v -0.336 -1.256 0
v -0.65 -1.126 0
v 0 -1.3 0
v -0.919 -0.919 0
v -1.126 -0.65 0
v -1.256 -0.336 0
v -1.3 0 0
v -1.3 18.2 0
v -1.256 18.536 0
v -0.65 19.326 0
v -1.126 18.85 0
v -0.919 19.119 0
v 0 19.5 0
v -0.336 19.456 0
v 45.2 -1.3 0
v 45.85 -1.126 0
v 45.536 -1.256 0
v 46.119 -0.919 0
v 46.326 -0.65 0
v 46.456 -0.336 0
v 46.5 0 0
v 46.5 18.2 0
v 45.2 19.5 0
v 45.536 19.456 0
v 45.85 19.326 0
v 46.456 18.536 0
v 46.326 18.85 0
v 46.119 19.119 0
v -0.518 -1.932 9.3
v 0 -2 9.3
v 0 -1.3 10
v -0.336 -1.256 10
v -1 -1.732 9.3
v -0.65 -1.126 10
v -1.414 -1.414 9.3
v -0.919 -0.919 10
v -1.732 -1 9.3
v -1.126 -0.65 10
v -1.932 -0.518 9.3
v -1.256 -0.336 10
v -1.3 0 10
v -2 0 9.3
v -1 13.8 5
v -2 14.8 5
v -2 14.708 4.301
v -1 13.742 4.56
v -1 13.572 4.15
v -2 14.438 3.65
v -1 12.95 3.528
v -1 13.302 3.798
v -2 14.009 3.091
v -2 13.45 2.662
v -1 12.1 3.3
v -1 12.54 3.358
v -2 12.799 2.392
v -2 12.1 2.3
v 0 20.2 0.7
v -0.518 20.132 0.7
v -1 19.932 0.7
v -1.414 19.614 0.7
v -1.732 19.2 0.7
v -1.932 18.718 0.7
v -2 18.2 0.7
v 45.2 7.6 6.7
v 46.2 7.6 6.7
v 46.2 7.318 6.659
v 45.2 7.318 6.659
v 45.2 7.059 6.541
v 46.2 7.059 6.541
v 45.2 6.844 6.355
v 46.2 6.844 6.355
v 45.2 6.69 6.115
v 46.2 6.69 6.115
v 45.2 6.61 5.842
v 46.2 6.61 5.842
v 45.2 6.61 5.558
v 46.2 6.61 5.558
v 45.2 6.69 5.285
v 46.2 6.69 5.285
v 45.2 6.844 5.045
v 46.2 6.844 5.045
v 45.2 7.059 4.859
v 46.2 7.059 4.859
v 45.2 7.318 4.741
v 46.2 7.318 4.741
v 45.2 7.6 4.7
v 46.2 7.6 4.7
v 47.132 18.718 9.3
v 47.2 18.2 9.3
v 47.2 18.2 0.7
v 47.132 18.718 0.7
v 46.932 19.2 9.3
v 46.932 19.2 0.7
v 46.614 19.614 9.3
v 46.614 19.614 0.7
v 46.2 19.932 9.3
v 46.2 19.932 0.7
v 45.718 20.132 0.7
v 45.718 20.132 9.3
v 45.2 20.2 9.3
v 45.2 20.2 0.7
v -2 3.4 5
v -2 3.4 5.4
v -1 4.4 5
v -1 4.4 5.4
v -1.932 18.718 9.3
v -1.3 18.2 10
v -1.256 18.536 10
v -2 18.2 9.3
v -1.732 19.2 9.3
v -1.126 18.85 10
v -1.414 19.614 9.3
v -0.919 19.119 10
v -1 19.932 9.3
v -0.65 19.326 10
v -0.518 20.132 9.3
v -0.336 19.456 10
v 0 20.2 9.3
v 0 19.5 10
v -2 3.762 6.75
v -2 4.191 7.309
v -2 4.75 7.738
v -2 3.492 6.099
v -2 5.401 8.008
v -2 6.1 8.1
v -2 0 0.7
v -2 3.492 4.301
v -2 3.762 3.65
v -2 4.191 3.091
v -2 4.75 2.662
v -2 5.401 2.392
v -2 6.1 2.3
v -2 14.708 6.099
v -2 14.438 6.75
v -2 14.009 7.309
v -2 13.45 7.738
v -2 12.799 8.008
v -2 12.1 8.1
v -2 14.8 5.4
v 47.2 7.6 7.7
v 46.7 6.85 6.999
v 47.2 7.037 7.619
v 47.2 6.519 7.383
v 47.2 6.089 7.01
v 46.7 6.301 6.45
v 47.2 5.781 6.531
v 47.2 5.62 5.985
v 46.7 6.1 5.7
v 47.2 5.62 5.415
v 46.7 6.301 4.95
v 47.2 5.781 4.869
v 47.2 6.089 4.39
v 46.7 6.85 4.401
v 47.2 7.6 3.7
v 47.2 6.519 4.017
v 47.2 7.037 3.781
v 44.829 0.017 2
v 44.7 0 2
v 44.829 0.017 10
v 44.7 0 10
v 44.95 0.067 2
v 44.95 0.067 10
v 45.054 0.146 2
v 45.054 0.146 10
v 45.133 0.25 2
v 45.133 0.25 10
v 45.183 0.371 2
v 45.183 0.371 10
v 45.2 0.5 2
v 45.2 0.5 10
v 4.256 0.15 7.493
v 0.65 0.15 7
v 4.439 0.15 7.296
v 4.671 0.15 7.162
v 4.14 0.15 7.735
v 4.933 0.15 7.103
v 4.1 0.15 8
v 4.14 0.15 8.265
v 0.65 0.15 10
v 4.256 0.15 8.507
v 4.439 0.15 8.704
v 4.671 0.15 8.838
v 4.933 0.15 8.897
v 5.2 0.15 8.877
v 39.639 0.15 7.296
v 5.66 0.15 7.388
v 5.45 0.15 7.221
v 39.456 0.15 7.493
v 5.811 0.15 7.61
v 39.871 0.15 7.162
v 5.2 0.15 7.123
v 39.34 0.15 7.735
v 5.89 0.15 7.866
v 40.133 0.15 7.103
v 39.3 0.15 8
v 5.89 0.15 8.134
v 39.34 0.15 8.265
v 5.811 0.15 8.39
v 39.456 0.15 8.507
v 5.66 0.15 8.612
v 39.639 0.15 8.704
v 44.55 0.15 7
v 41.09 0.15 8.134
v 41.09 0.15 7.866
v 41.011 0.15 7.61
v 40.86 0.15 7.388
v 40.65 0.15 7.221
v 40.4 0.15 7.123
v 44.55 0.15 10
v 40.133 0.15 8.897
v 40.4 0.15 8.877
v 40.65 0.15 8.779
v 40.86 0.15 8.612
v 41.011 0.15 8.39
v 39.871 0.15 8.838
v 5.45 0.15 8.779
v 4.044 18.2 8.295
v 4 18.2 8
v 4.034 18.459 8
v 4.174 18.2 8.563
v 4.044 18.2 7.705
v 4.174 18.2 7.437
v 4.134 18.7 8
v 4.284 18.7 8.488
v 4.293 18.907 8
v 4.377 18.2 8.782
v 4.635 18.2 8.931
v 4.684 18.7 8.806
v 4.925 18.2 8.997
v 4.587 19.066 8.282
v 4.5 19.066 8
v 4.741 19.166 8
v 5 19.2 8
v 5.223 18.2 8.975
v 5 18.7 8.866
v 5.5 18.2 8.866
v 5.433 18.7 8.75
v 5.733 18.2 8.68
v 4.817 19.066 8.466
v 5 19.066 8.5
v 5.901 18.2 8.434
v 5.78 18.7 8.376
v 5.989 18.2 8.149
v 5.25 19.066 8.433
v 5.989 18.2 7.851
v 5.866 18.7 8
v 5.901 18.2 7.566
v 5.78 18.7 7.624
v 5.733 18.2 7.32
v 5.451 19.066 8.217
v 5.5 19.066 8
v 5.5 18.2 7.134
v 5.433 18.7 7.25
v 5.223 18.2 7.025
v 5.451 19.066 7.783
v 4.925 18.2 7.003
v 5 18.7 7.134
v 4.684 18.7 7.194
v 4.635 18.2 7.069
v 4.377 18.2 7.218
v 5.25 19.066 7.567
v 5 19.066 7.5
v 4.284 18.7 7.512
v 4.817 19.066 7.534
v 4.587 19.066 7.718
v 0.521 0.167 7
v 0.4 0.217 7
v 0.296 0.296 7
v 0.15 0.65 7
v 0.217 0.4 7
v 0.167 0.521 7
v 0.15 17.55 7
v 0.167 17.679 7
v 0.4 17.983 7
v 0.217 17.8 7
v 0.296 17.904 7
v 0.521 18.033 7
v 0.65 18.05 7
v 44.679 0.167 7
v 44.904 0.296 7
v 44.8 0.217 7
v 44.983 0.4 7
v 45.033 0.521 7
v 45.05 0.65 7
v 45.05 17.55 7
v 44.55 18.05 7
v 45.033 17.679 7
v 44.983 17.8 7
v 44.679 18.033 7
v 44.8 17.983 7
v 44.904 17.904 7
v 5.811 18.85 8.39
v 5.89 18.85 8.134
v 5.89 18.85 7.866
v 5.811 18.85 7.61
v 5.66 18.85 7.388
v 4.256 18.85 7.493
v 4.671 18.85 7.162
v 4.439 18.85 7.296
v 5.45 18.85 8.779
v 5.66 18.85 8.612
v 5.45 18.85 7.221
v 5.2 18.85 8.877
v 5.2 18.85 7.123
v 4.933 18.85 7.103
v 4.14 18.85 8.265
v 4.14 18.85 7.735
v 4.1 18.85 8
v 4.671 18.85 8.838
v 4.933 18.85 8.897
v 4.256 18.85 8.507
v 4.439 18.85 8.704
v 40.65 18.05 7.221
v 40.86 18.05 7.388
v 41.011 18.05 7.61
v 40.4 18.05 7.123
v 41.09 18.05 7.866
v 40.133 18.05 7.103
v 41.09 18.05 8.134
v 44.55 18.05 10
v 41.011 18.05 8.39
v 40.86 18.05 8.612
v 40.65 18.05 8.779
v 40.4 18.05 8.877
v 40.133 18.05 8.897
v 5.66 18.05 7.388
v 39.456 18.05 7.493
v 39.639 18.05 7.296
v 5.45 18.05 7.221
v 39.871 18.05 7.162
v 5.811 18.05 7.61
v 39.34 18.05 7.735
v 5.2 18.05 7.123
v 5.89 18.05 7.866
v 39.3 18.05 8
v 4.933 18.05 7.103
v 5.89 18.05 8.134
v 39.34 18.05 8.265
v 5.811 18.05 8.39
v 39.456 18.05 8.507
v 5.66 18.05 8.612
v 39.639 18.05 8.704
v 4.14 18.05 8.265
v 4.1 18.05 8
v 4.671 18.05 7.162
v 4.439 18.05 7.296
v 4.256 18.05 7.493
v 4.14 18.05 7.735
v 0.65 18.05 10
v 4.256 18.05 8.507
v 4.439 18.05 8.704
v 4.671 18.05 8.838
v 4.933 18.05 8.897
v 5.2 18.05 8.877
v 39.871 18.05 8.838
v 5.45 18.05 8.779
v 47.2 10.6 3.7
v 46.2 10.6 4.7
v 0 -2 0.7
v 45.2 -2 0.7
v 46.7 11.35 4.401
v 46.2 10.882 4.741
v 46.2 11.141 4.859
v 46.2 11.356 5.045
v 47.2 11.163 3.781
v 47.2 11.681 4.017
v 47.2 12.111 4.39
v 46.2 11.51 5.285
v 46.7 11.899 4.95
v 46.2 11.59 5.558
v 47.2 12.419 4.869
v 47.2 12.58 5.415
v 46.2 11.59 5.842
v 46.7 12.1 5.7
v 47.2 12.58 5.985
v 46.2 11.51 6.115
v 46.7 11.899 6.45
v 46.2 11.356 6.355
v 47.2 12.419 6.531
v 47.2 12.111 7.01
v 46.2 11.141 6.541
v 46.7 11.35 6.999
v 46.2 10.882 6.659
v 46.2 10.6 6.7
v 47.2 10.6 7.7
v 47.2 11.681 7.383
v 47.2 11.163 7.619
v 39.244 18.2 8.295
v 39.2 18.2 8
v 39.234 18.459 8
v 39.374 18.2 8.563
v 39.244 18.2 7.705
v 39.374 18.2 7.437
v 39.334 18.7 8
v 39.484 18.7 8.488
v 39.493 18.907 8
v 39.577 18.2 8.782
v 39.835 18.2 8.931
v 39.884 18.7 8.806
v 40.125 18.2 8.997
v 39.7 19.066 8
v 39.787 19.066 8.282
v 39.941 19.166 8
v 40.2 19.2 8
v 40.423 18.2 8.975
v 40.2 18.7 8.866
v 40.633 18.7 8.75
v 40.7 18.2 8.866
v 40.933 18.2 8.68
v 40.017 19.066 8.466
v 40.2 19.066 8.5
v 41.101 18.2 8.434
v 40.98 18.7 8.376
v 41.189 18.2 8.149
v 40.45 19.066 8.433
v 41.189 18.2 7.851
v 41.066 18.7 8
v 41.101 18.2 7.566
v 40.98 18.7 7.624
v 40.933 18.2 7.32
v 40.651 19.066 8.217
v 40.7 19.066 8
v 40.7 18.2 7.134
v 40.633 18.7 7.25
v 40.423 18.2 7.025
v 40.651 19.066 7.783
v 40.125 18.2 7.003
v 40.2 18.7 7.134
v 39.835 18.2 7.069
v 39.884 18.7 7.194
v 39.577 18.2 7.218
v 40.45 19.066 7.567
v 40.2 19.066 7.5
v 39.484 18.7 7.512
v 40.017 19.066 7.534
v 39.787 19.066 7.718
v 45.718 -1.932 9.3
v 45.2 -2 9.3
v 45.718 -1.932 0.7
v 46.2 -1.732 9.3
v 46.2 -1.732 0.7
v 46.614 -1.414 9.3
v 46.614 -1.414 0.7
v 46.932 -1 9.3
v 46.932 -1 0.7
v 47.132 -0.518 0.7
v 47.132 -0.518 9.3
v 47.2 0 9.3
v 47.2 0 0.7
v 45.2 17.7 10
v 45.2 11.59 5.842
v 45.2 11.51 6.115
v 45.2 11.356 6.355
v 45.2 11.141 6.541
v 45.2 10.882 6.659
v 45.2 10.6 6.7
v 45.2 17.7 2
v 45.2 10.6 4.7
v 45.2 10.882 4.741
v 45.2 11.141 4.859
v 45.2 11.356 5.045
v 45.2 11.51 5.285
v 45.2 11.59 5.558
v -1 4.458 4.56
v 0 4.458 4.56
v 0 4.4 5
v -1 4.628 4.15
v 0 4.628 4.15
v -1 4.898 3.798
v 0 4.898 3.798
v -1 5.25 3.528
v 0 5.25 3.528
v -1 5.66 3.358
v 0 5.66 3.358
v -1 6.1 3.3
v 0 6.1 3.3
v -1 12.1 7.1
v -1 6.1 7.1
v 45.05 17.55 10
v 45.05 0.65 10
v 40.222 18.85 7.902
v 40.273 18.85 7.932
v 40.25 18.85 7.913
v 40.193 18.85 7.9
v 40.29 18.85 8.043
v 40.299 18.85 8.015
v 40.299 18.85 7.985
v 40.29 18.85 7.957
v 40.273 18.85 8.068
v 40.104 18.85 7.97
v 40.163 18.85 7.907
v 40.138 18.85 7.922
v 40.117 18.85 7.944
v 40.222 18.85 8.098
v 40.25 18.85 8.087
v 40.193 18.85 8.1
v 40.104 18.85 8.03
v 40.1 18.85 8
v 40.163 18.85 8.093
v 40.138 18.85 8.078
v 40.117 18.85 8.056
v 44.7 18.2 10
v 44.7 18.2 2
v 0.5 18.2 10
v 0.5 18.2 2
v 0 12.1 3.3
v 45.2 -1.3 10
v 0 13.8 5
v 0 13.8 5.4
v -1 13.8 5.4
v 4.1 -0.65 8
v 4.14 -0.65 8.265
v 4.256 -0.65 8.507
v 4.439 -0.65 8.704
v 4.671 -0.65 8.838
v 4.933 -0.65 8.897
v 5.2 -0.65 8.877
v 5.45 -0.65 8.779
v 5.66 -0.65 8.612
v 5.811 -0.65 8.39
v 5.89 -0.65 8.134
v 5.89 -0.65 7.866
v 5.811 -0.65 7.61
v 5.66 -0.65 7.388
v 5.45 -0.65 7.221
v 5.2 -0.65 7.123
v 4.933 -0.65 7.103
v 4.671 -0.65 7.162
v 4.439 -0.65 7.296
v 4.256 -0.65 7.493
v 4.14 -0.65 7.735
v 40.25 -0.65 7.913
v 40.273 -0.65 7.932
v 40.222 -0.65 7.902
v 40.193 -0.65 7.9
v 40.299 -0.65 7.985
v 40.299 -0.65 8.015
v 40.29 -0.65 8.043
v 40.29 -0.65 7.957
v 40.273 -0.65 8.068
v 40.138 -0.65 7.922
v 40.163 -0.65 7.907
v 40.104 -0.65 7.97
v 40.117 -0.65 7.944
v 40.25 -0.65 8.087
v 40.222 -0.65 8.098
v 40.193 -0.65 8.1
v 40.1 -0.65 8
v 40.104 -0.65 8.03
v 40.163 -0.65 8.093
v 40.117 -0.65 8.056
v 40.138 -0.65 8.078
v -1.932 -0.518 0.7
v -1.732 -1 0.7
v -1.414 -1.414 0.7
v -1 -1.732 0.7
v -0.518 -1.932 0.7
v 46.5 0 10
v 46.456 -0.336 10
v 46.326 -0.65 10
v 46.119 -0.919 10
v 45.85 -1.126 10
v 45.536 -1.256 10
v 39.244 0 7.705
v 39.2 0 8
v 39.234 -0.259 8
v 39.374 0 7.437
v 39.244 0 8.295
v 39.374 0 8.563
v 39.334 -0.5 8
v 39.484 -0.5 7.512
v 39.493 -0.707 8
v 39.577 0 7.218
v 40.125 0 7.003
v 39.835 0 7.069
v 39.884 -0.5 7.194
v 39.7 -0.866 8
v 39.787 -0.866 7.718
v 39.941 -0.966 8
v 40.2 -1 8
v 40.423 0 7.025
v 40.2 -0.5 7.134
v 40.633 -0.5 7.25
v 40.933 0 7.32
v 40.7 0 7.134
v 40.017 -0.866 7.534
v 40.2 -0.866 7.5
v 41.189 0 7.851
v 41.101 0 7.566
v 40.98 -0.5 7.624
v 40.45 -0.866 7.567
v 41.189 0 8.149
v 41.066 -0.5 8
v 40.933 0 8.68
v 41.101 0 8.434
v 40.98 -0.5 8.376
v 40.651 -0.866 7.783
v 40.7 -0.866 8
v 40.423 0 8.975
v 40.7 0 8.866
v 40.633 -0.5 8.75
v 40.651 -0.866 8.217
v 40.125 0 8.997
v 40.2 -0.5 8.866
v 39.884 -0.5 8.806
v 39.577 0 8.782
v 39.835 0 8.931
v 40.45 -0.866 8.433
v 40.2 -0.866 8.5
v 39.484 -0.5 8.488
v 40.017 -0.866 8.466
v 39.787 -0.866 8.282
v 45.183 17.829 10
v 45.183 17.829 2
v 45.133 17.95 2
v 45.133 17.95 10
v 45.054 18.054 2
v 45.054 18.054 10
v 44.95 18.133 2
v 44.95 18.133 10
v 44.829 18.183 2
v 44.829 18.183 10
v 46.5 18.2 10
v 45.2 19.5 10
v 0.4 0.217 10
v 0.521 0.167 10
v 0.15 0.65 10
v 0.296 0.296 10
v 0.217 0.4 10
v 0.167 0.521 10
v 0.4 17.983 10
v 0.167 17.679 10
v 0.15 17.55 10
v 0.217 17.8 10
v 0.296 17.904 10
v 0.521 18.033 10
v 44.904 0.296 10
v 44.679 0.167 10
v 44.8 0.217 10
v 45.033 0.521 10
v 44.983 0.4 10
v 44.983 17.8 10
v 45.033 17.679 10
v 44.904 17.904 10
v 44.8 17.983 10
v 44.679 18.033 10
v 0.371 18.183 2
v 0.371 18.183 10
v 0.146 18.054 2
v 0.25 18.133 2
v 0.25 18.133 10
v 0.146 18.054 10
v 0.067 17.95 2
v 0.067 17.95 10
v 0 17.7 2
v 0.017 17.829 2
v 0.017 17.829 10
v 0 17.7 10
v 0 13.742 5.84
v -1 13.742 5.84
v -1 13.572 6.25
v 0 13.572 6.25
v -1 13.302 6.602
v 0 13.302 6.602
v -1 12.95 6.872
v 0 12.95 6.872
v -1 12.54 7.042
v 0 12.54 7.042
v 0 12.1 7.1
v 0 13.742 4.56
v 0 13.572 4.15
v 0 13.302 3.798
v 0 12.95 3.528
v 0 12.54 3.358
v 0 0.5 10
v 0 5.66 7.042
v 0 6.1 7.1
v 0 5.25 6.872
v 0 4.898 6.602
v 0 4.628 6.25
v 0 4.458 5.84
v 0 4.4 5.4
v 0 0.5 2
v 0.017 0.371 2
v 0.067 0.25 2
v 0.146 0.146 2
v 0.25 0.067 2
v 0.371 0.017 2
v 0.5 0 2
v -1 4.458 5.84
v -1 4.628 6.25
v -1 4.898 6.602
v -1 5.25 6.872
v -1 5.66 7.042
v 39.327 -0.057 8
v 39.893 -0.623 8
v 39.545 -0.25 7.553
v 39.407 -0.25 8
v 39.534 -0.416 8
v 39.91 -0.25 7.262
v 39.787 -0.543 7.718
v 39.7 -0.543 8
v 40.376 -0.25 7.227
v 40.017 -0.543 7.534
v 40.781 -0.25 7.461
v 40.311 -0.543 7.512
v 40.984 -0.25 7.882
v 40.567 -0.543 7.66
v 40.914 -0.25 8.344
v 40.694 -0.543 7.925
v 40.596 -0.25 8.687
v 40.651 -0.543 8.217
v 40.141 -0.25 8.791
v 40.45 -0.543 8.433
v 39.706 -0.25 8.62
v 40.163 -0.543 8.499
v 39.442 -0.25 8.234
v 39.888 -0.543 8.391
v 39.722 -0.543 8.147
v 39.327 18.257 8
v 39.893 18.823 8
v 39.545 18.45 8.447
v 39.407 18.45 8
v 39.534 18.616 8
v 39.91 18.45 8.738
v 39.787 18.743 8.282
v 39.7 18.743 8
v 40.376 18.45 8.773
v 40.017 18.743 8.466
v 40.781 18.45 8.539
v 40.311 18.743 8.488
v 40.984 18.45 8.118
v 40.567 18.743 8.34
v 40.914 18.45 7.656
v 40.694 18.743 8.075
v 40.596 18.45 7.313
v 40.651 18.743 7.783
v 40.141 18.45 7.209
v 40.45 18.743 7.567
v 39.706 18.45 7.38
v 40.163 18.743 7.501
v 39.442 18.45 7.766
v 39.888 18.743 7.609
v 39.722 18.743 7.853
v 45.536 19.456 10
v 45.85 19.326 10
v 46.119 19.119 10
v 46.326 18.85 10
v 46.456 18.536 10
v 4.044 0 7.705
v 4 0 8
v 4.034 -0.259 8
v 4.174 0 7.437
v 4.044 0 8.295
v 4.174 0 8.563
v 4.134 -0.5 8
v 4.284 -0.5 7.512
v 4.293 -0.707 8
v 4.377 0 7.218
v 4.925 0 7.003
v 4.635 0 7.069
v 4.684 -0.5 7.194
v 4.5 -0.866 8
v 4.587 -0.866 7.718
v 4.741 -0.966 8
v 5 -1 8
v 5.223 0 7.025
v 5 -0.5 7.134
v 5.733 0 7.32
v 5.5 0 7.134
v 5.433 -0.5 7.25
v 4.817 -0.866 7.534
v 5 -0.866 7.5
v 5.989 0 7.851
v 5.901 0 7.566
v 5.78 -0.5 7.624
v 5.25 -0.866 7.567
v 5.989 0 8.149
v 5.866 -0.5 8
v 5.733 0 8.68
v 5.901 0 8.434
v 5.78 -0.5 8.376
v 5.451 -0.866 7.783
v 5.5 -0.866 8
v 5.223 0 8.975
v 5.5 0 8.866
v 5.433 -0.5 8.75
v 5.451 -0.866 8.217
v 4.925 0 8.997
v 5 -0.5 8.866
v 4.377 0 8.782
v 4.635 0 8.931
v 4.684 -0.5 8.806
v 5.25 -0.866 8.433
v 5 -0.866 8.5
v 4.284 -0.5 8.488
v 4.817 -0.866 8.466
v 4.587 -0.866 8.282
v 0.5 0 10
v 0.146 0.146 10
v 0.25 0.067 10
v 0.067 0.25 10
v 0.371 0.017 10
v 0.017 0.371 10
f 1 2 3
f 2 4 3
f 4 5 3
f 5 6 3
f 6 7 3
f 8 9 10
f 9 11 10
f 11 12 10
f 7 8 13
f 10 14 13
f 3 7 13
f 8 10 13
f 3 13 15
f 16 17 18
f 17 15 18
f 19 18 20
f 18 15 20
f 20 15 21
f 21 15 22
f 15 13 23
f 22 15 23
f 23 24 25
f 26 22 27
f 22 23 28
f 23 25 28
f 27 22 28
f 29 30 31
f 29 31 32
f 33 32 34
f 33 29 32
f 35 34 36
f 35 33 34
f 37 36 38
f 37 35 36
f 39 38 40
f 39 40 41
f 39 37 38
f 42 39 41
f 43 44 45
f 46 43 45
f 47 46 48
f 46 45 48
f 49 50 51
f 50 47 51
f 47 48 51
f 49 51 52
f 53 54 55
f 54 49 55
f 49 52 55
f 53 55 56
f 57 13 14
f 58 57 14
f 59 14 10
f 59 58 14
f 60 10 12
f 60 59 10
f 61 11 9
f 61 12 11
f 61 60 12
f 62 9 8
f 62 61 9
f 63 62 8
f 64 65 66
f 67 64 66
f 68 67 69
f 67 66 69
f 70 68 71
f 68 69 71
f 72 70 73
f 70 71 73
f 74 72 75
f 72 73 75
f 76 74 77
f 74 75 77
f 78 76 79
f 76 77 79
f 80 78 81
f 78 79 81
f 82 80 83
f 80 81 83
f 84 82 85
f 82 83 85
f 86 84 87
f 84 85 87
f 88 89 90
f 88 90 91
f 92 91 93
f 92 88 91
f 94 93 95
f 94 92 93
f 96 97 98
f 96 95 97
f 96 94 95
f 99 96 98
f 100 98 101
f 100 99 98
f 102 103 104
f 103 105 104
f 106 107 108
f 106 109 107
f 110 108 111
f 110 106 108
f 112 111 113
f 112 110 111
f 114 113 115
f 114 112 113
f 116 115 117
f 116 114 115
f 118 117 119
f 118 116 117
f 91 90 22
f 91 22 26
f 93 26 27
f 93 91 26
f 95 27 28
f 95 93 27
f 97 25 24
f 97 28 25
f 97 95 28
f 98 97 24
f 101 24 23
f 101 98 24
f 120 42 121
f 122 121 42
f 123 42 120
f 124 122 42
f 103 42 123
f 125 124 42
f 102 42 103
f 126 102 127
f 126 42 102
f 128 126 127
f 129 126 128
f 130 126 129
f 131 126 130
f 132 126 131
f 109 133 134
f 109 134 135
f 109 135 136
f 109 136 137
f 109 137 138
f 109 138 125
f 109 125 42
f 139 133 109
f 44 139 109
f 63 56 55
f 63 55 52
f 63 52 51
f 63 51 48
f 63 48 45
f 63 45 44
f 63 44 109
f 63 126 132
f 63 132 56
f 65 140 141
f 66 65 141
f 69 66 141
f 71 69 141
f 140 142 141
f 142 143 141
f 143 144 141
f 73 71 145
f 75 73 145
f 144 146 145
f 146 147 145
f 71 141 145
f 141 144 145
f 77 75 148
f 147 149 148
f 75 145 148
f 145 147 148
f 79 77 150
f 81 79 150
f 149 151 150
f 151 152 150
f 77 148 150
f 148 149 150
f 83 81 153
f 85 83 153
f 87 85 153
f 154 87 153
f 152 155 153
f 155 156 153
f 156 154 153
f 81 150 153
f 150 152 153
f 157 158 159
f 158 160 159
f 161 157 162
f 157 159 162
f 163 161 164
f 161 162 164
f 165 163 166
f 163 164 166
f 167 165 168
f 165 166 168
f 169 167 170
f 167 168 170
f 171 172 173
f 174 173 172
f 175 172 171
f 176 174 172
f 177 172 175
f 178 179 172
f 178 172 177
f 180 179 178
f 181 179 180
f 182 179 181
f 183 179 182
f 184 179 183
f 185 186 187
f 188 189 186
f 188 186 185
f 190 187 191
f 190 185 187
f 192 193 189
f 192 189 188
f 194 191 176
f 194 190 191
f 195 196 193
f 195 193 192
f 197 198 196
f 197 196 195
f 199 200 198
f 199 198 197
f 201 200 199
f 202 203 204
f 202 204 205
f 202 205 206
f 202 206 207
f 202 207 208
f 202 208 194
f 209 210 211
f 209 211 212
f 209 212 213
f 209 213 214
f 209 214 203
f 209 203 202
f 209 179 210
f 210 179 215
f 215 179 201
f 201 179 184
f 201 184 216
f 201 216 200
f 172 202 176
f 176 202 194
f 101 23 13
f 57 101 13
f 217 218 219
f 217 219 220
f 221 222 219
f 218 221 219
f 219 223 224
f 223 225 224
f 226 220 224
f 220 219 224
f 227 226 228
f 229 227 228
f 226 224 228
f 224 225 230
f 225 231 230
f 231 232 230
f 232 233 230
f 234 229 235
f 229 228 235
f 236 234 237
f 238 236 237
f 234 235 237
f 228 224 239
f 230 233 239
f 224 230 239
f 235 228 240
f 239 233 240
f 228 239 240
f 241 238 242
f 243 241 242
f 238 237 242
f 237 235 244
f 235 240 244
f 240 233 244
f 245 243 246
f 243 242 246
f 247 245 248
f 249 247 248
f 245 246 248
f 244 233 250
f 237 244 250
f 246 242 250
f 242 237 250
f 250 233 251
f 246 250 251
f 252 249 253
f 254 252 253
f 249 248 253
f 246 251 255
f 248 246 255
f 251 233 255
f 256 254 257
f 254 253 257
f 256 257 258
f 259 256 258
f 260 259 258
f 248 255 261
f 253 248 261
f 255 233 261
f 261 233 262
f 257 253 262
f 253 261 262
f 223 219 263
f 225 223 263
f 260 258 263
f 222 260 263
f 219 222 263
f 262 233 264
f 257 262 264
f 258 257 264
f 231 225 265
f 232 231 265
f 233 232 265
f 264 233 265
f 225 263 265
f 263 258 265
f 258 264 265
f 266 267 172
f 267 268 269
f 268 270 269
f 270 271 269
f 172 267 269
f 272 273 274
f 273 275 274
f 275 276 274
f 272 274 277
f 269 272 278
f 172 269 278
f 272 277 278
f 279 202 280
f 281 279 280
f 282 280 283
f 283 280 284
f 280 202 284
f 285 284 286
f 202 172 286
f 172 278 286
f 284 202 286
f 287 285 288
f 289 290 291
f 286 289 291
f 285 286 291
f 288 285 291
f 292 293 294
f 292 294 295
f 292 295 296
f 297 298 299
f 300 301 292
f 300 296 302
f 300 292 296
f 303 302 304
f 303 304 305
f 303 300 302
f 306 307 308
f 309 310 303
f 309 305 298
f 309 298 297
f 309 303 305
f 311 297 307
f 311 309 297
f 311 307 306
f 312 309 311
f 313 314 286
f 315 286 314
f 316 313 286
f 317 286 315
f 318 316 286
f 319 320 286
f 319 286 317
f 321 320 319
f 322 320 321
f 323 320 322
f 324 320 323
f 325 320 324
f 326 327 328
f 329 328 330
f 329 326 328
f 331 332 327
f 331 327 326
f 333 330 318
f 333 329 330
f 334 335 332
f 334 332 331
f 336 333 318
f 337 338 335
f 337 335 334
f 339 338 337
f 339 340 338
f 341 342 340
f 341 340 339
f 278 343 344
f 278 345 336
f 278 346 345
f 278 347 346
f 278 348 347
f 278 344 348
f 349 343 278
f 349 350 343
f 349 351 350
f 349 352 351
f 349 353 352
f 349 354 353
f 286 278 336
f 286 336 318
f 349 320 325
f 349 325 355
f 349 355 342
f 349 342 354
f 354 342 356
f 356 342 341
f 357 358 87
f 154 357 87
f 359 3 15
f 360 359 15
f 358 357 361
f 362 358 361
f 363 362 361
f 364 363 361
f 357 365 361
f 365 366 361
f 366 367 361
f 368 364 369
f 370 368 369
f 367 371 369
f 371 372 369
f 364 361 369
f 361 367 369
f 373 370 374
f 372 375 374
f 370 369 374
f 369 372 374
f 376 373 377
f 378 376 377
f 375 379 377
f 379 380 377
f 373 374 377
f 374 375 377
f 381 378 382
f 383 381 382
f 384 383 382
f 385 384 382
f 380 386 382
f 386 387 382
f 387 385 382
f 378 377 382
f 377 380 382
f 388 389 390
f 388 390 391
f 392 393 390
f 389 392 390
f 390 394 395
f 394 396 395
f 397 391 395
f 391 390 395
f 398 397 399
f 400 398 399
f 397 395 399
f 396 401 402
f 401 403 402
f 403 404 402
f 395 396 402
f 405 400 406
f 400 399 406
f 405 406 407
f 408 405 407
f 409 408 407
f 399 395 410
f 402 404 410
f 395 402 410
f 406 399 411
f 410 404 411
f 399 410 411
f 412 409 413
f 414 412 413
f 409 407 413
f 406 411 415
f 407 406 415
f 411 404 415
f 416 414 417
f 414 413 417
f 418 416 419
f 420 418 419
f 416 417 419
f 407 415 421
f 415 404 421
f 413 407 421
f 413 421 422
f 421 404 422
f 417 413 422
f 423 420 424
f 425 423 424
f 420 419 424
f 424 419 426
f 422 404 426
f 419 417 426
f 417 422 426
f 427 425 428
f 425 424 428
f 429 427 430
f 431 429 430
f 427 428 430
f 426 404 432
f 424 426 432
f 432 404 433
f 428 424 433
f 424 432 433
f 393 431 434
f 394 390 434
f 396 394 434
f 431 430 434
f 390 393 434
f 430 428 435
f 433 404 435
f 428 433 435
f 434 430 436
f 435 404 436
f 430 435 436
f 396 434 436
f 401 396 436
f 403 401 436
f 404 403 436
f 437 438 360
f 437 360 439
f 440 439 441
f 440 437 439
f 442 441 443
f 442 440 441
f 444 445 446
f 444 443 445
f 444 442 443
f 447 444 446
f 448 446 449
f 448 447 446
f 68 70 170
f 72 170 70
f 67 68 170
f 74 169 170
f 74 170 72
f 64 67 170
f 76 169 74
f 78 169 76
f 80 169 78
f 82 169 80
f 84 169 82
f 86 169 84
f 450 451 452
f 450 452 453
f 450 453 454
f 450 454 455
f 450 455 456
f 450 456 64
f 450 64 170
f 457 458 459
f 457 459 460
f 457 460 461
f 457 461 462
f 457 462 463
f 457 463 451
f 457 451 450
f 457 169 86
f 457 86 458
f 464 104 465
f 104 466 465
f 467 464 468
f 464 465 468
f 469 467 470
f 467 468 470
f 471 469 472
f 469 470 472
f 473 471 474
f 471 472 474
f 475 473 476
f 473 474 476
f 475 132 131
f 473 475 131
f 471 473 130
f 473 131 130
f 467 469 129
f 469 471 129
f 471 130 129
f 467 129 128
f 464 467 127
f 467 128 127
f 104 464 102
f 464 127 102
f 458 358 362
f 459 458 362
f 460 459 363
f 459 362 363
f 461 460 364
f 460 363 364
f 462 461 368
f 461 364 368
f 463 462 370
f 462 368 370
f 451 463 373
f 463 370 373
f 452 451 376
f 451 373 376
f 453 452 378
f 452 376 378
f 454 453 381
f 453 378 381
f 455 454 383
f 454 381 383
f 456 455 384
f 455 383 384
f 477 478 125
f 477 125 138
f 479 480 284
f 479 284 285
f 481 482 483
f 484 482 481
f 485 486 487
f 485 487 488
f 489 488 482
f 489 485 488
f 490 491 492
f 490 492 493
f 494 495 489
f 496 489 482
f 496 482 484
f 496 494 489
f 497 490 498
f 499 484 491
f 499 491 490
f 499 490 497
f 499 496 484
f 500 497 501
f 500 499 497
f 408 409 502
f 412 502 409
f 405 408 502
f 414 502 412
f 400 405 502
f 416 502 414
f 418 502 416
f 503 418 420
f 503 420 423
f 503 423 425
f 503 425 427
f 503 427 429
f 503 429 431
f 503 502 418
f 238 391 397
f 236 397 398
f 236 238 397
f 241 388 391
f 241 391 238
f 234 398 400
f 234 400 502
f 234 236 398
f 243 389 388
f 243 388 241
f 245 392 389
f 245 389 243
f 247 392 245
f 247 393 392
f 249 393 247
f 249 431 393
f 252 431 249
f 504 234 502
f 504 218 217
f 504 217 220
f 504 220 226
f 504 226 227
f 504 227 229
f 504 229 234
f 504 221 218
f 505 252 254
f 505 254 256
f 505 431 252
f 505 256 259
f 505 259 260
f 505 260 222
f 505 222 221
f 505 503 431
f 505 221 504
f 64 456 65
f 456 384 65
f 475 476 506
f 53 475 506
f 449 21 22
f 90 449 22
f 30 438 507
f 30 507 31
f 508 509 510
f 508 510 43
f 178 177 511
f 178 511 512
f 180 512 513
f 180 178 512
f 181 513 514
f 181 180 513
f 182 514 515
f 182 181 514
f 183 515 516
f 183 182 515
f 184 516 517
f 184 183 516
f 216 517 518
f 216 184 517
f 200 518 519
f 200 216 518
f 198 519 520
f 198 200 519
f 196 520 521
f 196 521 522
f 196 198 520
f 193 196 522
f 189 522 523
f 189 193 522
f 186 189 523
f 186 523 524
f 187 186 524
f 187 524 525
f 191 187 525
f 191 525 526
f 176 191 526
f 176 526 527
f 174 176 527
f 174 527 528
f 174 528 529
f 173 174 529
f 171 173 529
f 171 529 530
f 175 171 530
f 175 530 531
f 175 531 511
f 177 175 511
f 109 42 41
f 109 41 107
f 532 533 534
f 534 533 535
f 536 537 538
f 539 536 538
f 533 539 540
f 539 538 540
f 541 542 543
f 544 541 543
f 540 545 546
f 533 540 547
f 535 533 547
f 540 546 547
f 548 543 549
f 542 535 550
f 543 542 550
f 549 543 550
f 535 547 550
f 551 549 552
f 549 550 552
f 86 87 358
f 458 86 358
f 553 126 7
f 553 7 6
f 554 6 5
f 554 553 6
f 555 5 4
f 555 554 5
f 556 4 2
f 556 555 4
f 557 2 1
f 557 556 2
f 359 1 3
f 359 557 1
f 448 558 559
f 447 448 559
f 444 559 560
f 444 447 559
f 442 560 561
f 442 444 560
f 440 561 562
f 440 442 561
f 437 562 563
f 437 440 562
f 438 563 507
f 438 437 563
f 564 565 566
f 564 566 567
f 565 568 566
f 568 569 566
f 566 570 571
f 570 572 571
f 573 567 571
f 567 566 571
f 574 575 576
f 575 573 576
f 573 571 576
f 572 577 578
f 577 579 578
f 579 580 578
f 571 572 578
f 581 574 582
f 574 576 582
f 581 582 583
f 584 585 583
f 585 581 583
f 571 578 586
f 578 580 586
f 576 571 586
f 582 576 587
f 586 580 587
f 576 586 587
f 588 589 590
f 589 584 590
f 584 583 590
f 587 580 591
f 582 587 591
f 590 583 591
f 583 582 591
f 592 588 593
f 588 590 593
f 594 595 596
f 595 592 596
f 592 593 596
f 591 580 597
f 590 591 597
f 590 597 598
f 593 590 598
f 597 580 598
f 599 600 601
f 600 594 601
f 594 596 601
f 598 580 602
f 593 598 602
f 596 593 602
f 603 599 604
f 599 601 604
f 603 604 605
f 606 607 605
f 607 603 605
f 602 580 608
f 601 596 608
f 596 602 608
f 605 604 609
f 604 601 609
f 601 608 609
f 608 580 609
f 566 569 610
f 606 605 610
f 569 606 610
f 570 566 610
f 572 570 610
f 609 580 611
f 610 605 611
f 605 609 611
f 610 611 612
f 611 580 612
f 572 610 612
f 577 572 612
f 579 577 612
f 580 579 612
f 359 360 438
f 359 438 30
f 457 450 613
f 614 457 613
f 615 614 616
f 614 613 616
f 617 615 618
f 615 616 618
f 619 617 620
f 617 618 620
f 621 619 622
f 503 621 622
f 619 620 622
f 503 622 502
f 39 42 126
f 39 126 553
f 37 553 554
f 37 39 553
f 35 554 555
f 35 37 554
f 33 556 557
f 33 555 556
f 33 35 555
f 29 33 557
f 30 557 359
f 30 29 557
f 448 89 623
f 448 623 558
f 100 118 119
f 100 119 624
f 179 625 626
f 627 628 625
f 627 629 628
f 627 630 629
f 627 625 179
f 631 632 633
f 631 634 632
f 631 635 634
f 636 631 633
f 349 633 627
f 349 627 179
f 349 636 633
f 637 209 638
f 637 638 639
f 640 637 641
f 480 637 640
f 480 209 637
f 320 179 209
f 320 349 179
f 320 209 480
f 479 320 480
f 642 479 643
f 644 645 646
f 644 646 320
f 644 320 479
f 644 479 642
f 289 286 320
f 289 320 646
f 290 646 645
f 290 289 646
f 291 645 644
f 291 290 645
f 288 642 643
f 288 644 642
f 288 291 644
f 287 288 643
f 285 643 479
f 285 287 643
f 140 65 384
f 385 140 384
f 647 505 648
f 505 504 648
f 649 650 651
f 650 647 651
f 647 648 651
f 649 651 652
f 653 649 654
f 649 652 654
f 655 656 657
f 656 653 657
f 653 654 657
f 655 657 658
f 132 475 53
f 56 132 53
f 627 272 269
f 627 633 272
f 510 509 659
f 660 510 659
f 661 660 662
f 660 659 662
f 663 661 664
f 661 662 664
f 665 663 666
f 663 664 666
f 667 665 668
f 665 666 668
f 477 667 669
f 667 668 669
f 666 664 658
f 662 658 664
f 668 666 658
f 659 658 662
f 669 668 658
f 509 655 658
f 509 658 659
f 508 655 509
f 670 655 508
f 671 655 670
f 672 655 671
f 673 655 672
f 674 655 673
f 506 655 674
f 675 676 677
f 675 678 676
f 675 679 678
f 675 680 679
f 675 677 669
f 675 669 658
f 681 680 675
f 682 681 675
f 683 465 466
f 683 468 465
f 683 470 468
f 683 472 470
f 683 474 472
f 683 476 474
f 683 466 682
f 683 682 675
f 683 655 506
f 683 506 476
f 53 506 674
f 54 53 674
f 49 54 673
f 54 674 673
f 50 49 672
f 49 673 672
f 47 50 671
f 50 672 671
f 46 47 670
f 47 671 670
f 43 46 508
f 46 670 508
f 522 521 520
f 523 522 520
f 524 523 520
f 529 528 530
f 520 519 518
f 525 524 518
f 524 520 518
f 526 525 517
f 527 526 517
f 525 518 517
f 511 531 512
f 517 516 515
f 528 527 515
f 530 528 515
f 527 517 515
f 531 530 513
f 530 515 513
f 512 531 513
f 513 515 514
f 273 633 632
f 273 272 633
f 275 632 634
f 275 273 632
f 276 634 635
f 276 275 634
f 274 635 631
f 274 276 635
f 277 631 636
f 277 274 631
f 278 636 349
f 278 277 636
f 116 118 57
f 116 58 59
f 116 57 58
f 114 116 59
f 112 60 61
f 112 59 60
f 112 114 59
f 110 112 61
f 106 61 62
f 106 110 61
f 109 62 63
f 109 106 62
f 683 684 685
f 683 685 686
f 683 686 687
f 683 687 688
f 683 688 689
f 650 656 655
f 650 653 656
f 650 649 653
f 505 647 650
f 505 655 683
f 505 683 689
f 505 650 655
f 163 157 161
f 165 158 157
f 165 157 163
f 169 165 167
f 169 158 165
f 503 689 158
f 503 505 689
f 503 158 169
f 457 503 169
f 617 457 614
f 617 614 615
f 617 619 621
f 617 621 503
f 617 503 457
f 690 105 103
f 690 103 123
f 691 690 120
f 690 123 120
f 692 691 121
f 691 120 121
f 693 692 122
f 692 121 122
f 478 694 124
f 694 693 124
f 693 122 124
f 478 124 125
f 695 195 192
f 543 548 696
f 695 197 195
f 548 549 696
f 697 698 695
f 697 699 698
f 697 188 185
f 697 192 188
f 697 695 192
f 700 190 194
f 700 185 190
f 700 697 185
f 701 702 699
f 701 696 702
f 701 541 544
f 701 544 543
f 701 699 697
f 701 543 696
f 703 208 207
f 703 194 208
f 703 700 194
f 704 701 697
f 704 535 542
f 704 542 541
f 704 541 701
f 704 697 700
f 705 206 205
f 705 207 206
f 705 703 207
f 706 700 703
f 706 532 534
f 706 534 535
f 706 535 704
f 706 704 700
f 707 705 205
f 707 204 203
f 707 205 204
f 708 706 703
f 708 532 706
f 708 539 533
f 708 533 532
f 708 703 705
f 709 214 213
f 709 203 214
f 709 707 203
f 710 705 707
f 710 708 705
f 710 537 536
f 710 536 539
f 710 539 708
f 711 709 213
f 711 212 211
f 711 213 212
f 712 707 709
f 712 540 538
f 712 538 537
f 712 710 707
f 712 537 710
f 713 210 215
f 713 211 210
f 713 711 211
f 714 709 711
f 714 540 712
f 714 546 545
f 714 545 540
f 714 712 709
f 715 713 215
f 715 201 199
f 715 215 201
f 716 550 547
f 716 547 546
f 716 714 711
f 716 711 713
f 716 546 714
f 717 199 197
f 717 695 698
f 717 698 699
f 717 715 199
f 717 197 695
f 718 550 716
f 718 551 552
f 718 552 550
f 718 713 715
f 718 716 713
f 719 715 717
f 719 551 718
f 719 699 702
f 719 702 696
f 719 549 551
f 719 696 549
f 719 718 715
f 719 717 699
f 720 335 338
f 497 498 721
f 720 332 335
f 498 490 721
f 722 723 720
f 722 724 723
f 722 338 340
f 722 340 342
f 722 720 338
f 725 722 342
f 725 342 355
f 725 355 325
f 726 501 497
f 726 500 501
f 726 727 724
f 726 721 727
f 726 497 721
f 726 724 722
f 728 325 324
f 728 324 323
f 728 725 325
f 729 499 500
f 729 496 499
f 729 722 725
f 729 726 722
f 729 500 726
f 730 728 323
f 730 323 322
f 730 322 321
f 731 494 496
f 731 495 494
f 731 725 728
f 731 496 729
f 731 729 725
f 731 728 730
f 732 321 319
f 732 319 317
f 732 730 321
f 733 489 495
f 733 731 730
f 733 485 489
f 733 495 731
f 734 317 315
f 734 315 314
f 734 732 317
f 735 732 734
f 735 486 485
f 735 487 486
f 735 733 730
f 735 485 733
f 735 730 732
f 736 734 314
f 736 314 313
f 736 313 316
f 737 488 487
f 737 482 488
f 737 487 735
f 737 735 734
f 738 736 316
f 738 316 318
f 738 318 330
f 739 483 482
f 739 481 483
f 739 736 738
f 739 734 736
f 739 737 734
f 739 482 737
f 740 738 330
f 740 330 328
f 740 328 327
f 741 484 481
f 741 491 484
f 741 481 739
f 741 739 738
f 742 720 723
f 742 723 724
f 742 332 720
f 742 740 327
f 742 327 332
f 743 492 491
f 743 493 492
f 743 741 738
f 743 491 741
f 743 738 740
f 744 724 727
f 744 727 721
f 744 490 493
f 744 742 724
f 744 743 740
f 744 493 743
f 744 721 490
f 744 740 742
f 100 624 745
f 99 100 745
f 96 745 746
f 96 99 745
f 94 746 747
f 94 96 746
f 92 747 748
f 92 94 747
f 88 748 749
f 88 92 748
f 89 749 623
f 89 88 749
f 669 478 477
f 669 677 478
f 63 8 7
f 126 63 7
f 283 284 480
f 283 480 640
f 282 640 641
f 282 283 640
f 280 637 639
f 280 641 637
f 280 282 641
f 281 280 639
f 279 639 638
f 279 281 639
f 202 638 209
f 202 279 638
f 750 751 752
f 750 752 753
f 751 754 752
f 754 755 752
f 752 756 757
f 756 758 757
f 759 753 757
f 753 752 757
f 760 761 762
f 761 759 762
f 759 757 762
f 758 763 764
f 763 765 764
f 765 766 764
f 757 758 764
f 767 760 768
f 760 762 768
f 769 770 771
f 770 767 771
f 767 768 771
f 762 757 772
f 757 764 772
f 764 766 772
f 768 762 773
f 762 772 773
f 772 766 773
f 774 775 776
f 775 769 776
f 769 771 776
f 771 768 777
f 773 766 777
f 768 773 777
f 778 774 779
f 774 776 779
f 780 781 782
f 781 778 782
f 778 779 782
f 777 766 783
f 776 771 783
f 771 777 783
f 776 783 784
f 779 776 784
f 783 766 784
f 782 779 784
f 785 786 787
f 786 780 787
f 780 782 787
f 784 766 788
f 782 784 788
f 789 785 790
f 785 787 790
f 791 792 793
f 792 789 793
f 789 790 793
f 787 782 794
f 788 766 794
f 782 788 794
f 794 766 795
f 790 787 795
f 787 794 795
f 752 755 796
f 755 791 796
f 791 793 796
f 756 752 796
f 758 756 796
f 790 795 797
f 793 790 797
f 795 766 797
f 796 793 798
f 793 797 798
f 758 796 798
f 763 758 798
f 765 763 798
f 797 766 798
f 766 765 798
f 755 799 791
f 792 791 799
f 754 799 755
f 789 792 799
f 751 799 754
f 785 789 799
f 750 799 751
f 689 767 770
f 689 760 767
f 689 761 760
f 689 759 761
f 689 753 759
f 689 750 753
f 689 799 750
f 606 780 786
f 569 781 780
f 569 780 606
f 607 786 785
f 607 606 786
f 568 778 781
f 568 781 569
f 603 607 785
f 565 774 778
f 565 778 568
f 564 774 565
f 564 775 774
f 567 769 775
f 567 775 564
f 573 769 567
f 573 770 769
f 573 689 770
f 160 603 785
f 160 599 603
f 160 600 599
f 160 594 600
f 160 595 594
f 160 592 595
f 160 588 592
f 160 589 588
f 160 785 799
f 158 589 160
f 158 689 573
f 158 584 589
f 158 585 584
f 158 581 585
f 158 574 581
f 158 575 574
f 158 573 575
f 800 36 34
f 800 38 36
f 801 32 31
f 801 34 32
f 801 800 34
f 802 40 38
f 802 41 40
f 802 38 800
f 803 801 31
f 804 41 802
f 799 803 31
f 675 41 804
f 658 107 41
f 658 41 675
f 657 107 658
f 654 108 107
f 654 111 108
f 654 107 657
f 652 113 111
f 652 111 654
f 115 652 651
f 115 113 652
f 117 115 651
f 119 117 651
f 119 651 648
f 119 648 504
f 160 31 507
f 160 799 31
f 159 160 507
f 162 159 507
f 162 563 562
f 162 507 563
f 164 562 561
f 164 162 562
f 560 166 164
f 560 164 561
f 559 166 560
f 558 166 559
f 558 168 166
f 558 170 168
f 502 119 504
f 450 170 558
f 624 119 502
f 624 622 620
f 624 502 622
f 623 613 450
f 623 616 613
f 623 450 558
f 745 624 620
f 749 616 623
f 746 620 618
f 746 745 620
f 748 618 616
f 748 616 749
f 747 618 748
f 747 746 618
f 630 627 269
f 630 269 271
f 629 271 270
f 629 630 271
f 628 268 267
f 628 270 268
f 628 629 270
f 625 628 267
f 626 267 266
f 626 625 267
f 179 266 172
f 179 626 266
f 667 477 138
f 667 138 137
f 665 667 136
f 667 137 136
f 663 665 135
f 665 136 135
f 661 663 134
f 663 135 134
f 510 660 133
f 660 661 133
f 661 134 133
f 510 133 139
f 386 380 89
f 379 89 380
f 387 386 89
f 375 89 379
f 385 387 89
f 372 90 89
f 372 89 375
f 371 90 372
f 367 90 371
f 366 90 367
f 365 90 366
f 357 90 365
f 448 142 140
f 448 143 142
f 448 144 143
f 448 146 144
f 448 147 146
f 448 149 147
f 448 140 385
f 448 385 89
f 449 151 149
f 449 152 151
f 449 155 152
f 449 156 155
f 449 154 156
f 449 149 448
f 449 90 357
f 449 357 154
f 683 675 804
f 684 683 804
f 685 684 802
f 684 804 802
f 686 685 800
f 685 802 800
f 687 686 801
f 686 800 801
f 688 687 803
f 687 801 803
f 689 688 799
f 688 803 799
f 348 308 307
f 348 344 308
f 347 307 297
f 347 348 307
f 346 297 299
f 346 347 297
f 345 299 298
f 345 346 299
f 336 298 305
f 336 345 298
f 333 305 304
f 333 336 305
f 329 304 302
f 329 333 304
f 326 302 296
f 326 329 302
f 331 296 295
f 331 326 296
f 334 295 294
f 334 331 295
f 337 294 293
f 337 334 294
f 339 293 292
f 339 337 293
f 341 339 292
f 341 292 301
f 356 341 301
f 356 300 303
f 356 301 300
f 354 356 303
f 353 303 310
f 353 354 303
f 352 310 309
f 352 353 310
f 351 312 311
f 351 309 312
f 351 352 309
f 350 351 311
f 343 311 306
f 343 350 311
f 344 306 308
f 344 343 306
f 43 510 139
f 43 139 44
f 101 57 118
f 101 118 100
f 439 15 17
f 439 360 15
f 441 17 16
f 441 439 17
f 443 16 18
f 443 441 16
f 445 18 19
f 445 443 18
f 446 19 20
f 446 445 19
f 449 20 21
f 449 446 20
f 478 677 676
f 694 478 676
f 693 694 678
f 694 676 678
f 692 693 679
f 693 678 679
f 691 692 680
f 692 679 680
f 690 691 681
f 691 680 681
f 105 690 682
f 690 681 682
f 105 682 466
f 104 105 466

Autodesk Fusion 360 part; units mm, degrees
sketch "Sketch1" plane through (0, 0, 0) normal (0, 0, 1) x (1, 0, 0)
  line L0 (0, 0) -> (45.2, 0)
  line L1 (45.2, 0) -> (45.2, 18.2)
  line L2 (45.2, 18.2) -> (0, 18.2)
  line L3 (0, 18.2) -> (0, 0)
  line L4 (-2, 20.2) -> (47.2, 20.2)
  line L5 (47.2, 20.2) -> (47.2, -2)
  line L6 (47.2, -2) -> (-2, -2)
  line L7 (-2, -2) -> (-2, 20.2)
  dimension "d1" = 45.2
  dimension "d2" = 18.2
  dimension "d3" = 2
  dimension "d4" = 2
  dimension "d5" = 2
  dimension "d6" = 2
extrude "Extrude1" add sketch "Sketch1" along normal blind 2 contours L0 L1 L2 L3 makes body 1 in component "Component"
extrude "Extrude2" add sketch "Sketch1" along normal blind 10 bodies 1 in component "Component"
extrude "Extrude1'" add sketch "Sketch1" against normal blind 3 from surface at 10 separate body contours L0 L1 L2 L3 makes body 2 in component "Component'"
sketch "Sketch2" plane through (0, 0, 0) normal (0, 1, 0) x (-1, 0, 0)
  line L0 (-45.2, 2) -> (0, 2)
  line L1 (0, 2) -> (0, 10)
  line L2 (0, 10) -> (-45.2, 10)
  line L3 (-45.2, 10) -> (-45.2, 2)
  line L4 (-22.6, 2) -> (-22.6, 13) construction
  circle A0 centre (-40.2, 8) radius 1
  circle A1 centre (-5, 8) radius 1
  circle A2 centre (-5, 8) radius 0.9
  circle A3 centre (-40.2, 8) radius 0.9
  dimension "d18" = 2
  dimension "d19" = 2
  dimension "d20" = 5
  dimension "d47" = -0.1
extrude "Extrude3" cut sketch "Sketch2" against normal blind 1 contours A0 | A1 | A2 | A3 bodies 1 in component "Component"
extrude "Extrude4" cut sketch "Sketch2" along normal blind 1 from surface at 18.2 contours A0 | A1 | A2 | A3 bodies 1 in component "Component"
fillet "Fillet1" radius 1 4 edges at (5.9323, 19.2, 7.6384) (41.1323, 19.2, 7.6384) (5.9323, -1, 8.3616) (41.1323, -1, 8.3616) on bodies 1 in component "Component"
move_face "OffsetFaces1" offset -0.15 4 faces at (15.0667, 0, 9) (0, 12.1333, 9) (30.1333, 18.2, 9) (45.2, 6.0667, 9) on bodies 2 in component "Component'"
extrude "Extrude2'" add sketch "Sketch2" against normal blind 0.8 from surface at 0.15 contours A2 | A3 bodies 2 in component "Component'"
extrude "Extrude3'" add sketch "Sketch2" along normal blind 0.8 from surface at 18.05 contours A2 | A3 bodies 2 in component "Component'"
fillet "Fillet1'" radius 0.8 4 faces at (40.2224, 18.85, 8.2858) (40.2224, 18.85, 8.2858) (40.2224, -0.65, 8.2858) (40.2224, -0.65, 8.2858) on bodies 2 in component "Component'"
sketch "Sketch3" plane through (0, 0, 0) normal (1, 0, 0) x (0, 1, 0)
  line L0 (0, 2) -> (18.2, 2)
  line L1 (18.2, 2) -> (18.2, 10)
  line L2 (18.2, 10) -> (0, 10)
  line L3 (0, 10) -> (0, 2)
  line L4 (9.1, 2) -> (9.1, 6.8) construction
  line L5 (6.1, 6.8) -> (12.1, 6.8) construction
  line L6 (4.7, 5.4) -> (4.7, 5) construction
  line L7 (6.1, 3.6) -> (12.1, 3.6) construction
  line L8 (13.5, 5.4) -> (13.5, 5) construction
  arc A0 (6.1, 6.8) -> (4.7, 5.4) centre (6.1, 5.4) ccw construction
  arc A1 (13.5, 5.4) -> (12.1, 6.8) centre (12.1, 5.4) ccw construction
  arc A2 (12.1, 3.6) -> (13.5, 5) centre (12.1, 5) ccw construction
  arc A3 (4.7, 5) -> (6.1, 3.6) centre (6.1, 5) ccw construction
  arc A4 (13.8, 5.4) -> (12.1, 7.1) centre (12.1, 5.4) ccw
  line L9 (6.1, 7.1) -> (12.1, 7.1)
  arc A5 (6.1, 7.1) -> (4.4, 5.4) centre (6.1, 5.4) ccw
  line L10 (4.4, 5.4) -> (4.4, 5)
  arc A6 (4.4, 5) -> (6.1, 3.3) centre (6.1, 5) ccw
  line L11 (6.1, 3.3) -> (12.1, 3.3)
  arc A7 (12.1, 3.3) -> (13.8, 5) centre (12.1, 5) ccw
  line L12 (13.8, 5.4) -> (13.8, 5)
  dimension "d36" = 3.2
  dimension "d37" = 1.6
  dimension "d38" = 8.8
  dimension "d39" = 1.4
  dimension "d40" = -0.3
extrude "Extrude5" cut sketch "Sketch3" against normal blind 2 contours A4 L9 A5 L10 A6 L11 A7 L12 bodies 1 in component "Component"
fillet "Fillet2" radius 2 4 edges at (-2, -2, 5) (47.2, -2, 5) (47.2, 20.2, 5) (-2, 20.2, 5) on bodies 1 in component "Component"
chamfer "Chamfer1" distance 0.7 angle 45 8 edges at (-2, 9.1, 10) (-1.4142, -1.4142, 10) (22.6, -2, 10) (46.6142, -1.4142, 10) (47.2, 9.1, 10) (46.6142, 19.6142, 10) (22.6, 20.2, 10) (-1.4142, 19.6142, 10) 1 faces at (15.0667, 5.4, 0) on bodies 1 in component "Component"
sketch "Sketch4" plane through (47.2, 0, 0) normal (1, 0, 0) x (0, 1, 0)
  line L0 (0, 0.7) -> (18.2, 0.7)
  line L1 (18.2, 0.7) -> (18.2, 9.3)
  line L2 (18.2, 9.3) -> (0, 9.3)
  line L3 (0, 9.3) -> (0, 0.7)
  line L4 (7.6, 4.7) -> (10.6, 4.7)
  arc A0 (10.6, 4.7) -> (10.6, 6.7) centre (10.6, 5.7) ccw
  line L5 (10.6, 6.7) -> (7.6, 6.7)
  arc A1 (7.6, 6.7) -> (7.6, 4.7) centre (7.6, 5.7) ccw
  line L6 (7.6, 5.7) -> (10.6, 5.7) construction
  line L7 (9.1, 0.7) -> (9.1, 5.7) construction
  dimension "d50" = 2
  dimension "d51" = 3
  dimension "d52" = 4
extrude "Extrude6" cut sketch "Sketch4" against normal blind 2 contours L4 A0 L5 A1 bodies 1 in component "Component"
chamfer "Chamfer2" distance 1 angle 45 12 edges at (-2, 13.3021, 3.7979) (-2, 13.8, 5.2) (-2, 13.3021, 6.6021) (-2, 9.1, 7.1) (-2, 4.8979, 6.6021) (-2, 4.4, 5.2) (-2, 4.8979, 3.7979) (-2, 9.1, 3.3) (47.2, 9.1, 4.7) (47.2, 6.6, 5.7) (47.2, 9.1, 6.7) (47.2, 11.6, 5.7) on bodies 1 in component "Component"
fillet "Fillet2'" radius 0.5 4 edges at (0.15, 0.15, 8.5) (0.15, 18.05, 8.5) (45.05, 18.05, 8.5) (45.05, 0.15, 8.5) on bodies 2 in component "Component'"
fillet "Fillet3" radius 0.5 4 edges at (0, 0, 6) (0, 18.2, 6) (45.2, 18.2, 6) (45.2, 0, 6) on bodies 1 in component "Component"
component "Component" placed x (1, 0, 0) y (0, 1, 0) z (0, 0, 1) at (0, 0, 0)
component "Component'" placed x (1, 0, 0) y (0, 1, 0) z (0, 0, 1) at (0, 0, 0)
equation "d4 = d3"
equation "d5 = d3"
equation "d6 = d3"
